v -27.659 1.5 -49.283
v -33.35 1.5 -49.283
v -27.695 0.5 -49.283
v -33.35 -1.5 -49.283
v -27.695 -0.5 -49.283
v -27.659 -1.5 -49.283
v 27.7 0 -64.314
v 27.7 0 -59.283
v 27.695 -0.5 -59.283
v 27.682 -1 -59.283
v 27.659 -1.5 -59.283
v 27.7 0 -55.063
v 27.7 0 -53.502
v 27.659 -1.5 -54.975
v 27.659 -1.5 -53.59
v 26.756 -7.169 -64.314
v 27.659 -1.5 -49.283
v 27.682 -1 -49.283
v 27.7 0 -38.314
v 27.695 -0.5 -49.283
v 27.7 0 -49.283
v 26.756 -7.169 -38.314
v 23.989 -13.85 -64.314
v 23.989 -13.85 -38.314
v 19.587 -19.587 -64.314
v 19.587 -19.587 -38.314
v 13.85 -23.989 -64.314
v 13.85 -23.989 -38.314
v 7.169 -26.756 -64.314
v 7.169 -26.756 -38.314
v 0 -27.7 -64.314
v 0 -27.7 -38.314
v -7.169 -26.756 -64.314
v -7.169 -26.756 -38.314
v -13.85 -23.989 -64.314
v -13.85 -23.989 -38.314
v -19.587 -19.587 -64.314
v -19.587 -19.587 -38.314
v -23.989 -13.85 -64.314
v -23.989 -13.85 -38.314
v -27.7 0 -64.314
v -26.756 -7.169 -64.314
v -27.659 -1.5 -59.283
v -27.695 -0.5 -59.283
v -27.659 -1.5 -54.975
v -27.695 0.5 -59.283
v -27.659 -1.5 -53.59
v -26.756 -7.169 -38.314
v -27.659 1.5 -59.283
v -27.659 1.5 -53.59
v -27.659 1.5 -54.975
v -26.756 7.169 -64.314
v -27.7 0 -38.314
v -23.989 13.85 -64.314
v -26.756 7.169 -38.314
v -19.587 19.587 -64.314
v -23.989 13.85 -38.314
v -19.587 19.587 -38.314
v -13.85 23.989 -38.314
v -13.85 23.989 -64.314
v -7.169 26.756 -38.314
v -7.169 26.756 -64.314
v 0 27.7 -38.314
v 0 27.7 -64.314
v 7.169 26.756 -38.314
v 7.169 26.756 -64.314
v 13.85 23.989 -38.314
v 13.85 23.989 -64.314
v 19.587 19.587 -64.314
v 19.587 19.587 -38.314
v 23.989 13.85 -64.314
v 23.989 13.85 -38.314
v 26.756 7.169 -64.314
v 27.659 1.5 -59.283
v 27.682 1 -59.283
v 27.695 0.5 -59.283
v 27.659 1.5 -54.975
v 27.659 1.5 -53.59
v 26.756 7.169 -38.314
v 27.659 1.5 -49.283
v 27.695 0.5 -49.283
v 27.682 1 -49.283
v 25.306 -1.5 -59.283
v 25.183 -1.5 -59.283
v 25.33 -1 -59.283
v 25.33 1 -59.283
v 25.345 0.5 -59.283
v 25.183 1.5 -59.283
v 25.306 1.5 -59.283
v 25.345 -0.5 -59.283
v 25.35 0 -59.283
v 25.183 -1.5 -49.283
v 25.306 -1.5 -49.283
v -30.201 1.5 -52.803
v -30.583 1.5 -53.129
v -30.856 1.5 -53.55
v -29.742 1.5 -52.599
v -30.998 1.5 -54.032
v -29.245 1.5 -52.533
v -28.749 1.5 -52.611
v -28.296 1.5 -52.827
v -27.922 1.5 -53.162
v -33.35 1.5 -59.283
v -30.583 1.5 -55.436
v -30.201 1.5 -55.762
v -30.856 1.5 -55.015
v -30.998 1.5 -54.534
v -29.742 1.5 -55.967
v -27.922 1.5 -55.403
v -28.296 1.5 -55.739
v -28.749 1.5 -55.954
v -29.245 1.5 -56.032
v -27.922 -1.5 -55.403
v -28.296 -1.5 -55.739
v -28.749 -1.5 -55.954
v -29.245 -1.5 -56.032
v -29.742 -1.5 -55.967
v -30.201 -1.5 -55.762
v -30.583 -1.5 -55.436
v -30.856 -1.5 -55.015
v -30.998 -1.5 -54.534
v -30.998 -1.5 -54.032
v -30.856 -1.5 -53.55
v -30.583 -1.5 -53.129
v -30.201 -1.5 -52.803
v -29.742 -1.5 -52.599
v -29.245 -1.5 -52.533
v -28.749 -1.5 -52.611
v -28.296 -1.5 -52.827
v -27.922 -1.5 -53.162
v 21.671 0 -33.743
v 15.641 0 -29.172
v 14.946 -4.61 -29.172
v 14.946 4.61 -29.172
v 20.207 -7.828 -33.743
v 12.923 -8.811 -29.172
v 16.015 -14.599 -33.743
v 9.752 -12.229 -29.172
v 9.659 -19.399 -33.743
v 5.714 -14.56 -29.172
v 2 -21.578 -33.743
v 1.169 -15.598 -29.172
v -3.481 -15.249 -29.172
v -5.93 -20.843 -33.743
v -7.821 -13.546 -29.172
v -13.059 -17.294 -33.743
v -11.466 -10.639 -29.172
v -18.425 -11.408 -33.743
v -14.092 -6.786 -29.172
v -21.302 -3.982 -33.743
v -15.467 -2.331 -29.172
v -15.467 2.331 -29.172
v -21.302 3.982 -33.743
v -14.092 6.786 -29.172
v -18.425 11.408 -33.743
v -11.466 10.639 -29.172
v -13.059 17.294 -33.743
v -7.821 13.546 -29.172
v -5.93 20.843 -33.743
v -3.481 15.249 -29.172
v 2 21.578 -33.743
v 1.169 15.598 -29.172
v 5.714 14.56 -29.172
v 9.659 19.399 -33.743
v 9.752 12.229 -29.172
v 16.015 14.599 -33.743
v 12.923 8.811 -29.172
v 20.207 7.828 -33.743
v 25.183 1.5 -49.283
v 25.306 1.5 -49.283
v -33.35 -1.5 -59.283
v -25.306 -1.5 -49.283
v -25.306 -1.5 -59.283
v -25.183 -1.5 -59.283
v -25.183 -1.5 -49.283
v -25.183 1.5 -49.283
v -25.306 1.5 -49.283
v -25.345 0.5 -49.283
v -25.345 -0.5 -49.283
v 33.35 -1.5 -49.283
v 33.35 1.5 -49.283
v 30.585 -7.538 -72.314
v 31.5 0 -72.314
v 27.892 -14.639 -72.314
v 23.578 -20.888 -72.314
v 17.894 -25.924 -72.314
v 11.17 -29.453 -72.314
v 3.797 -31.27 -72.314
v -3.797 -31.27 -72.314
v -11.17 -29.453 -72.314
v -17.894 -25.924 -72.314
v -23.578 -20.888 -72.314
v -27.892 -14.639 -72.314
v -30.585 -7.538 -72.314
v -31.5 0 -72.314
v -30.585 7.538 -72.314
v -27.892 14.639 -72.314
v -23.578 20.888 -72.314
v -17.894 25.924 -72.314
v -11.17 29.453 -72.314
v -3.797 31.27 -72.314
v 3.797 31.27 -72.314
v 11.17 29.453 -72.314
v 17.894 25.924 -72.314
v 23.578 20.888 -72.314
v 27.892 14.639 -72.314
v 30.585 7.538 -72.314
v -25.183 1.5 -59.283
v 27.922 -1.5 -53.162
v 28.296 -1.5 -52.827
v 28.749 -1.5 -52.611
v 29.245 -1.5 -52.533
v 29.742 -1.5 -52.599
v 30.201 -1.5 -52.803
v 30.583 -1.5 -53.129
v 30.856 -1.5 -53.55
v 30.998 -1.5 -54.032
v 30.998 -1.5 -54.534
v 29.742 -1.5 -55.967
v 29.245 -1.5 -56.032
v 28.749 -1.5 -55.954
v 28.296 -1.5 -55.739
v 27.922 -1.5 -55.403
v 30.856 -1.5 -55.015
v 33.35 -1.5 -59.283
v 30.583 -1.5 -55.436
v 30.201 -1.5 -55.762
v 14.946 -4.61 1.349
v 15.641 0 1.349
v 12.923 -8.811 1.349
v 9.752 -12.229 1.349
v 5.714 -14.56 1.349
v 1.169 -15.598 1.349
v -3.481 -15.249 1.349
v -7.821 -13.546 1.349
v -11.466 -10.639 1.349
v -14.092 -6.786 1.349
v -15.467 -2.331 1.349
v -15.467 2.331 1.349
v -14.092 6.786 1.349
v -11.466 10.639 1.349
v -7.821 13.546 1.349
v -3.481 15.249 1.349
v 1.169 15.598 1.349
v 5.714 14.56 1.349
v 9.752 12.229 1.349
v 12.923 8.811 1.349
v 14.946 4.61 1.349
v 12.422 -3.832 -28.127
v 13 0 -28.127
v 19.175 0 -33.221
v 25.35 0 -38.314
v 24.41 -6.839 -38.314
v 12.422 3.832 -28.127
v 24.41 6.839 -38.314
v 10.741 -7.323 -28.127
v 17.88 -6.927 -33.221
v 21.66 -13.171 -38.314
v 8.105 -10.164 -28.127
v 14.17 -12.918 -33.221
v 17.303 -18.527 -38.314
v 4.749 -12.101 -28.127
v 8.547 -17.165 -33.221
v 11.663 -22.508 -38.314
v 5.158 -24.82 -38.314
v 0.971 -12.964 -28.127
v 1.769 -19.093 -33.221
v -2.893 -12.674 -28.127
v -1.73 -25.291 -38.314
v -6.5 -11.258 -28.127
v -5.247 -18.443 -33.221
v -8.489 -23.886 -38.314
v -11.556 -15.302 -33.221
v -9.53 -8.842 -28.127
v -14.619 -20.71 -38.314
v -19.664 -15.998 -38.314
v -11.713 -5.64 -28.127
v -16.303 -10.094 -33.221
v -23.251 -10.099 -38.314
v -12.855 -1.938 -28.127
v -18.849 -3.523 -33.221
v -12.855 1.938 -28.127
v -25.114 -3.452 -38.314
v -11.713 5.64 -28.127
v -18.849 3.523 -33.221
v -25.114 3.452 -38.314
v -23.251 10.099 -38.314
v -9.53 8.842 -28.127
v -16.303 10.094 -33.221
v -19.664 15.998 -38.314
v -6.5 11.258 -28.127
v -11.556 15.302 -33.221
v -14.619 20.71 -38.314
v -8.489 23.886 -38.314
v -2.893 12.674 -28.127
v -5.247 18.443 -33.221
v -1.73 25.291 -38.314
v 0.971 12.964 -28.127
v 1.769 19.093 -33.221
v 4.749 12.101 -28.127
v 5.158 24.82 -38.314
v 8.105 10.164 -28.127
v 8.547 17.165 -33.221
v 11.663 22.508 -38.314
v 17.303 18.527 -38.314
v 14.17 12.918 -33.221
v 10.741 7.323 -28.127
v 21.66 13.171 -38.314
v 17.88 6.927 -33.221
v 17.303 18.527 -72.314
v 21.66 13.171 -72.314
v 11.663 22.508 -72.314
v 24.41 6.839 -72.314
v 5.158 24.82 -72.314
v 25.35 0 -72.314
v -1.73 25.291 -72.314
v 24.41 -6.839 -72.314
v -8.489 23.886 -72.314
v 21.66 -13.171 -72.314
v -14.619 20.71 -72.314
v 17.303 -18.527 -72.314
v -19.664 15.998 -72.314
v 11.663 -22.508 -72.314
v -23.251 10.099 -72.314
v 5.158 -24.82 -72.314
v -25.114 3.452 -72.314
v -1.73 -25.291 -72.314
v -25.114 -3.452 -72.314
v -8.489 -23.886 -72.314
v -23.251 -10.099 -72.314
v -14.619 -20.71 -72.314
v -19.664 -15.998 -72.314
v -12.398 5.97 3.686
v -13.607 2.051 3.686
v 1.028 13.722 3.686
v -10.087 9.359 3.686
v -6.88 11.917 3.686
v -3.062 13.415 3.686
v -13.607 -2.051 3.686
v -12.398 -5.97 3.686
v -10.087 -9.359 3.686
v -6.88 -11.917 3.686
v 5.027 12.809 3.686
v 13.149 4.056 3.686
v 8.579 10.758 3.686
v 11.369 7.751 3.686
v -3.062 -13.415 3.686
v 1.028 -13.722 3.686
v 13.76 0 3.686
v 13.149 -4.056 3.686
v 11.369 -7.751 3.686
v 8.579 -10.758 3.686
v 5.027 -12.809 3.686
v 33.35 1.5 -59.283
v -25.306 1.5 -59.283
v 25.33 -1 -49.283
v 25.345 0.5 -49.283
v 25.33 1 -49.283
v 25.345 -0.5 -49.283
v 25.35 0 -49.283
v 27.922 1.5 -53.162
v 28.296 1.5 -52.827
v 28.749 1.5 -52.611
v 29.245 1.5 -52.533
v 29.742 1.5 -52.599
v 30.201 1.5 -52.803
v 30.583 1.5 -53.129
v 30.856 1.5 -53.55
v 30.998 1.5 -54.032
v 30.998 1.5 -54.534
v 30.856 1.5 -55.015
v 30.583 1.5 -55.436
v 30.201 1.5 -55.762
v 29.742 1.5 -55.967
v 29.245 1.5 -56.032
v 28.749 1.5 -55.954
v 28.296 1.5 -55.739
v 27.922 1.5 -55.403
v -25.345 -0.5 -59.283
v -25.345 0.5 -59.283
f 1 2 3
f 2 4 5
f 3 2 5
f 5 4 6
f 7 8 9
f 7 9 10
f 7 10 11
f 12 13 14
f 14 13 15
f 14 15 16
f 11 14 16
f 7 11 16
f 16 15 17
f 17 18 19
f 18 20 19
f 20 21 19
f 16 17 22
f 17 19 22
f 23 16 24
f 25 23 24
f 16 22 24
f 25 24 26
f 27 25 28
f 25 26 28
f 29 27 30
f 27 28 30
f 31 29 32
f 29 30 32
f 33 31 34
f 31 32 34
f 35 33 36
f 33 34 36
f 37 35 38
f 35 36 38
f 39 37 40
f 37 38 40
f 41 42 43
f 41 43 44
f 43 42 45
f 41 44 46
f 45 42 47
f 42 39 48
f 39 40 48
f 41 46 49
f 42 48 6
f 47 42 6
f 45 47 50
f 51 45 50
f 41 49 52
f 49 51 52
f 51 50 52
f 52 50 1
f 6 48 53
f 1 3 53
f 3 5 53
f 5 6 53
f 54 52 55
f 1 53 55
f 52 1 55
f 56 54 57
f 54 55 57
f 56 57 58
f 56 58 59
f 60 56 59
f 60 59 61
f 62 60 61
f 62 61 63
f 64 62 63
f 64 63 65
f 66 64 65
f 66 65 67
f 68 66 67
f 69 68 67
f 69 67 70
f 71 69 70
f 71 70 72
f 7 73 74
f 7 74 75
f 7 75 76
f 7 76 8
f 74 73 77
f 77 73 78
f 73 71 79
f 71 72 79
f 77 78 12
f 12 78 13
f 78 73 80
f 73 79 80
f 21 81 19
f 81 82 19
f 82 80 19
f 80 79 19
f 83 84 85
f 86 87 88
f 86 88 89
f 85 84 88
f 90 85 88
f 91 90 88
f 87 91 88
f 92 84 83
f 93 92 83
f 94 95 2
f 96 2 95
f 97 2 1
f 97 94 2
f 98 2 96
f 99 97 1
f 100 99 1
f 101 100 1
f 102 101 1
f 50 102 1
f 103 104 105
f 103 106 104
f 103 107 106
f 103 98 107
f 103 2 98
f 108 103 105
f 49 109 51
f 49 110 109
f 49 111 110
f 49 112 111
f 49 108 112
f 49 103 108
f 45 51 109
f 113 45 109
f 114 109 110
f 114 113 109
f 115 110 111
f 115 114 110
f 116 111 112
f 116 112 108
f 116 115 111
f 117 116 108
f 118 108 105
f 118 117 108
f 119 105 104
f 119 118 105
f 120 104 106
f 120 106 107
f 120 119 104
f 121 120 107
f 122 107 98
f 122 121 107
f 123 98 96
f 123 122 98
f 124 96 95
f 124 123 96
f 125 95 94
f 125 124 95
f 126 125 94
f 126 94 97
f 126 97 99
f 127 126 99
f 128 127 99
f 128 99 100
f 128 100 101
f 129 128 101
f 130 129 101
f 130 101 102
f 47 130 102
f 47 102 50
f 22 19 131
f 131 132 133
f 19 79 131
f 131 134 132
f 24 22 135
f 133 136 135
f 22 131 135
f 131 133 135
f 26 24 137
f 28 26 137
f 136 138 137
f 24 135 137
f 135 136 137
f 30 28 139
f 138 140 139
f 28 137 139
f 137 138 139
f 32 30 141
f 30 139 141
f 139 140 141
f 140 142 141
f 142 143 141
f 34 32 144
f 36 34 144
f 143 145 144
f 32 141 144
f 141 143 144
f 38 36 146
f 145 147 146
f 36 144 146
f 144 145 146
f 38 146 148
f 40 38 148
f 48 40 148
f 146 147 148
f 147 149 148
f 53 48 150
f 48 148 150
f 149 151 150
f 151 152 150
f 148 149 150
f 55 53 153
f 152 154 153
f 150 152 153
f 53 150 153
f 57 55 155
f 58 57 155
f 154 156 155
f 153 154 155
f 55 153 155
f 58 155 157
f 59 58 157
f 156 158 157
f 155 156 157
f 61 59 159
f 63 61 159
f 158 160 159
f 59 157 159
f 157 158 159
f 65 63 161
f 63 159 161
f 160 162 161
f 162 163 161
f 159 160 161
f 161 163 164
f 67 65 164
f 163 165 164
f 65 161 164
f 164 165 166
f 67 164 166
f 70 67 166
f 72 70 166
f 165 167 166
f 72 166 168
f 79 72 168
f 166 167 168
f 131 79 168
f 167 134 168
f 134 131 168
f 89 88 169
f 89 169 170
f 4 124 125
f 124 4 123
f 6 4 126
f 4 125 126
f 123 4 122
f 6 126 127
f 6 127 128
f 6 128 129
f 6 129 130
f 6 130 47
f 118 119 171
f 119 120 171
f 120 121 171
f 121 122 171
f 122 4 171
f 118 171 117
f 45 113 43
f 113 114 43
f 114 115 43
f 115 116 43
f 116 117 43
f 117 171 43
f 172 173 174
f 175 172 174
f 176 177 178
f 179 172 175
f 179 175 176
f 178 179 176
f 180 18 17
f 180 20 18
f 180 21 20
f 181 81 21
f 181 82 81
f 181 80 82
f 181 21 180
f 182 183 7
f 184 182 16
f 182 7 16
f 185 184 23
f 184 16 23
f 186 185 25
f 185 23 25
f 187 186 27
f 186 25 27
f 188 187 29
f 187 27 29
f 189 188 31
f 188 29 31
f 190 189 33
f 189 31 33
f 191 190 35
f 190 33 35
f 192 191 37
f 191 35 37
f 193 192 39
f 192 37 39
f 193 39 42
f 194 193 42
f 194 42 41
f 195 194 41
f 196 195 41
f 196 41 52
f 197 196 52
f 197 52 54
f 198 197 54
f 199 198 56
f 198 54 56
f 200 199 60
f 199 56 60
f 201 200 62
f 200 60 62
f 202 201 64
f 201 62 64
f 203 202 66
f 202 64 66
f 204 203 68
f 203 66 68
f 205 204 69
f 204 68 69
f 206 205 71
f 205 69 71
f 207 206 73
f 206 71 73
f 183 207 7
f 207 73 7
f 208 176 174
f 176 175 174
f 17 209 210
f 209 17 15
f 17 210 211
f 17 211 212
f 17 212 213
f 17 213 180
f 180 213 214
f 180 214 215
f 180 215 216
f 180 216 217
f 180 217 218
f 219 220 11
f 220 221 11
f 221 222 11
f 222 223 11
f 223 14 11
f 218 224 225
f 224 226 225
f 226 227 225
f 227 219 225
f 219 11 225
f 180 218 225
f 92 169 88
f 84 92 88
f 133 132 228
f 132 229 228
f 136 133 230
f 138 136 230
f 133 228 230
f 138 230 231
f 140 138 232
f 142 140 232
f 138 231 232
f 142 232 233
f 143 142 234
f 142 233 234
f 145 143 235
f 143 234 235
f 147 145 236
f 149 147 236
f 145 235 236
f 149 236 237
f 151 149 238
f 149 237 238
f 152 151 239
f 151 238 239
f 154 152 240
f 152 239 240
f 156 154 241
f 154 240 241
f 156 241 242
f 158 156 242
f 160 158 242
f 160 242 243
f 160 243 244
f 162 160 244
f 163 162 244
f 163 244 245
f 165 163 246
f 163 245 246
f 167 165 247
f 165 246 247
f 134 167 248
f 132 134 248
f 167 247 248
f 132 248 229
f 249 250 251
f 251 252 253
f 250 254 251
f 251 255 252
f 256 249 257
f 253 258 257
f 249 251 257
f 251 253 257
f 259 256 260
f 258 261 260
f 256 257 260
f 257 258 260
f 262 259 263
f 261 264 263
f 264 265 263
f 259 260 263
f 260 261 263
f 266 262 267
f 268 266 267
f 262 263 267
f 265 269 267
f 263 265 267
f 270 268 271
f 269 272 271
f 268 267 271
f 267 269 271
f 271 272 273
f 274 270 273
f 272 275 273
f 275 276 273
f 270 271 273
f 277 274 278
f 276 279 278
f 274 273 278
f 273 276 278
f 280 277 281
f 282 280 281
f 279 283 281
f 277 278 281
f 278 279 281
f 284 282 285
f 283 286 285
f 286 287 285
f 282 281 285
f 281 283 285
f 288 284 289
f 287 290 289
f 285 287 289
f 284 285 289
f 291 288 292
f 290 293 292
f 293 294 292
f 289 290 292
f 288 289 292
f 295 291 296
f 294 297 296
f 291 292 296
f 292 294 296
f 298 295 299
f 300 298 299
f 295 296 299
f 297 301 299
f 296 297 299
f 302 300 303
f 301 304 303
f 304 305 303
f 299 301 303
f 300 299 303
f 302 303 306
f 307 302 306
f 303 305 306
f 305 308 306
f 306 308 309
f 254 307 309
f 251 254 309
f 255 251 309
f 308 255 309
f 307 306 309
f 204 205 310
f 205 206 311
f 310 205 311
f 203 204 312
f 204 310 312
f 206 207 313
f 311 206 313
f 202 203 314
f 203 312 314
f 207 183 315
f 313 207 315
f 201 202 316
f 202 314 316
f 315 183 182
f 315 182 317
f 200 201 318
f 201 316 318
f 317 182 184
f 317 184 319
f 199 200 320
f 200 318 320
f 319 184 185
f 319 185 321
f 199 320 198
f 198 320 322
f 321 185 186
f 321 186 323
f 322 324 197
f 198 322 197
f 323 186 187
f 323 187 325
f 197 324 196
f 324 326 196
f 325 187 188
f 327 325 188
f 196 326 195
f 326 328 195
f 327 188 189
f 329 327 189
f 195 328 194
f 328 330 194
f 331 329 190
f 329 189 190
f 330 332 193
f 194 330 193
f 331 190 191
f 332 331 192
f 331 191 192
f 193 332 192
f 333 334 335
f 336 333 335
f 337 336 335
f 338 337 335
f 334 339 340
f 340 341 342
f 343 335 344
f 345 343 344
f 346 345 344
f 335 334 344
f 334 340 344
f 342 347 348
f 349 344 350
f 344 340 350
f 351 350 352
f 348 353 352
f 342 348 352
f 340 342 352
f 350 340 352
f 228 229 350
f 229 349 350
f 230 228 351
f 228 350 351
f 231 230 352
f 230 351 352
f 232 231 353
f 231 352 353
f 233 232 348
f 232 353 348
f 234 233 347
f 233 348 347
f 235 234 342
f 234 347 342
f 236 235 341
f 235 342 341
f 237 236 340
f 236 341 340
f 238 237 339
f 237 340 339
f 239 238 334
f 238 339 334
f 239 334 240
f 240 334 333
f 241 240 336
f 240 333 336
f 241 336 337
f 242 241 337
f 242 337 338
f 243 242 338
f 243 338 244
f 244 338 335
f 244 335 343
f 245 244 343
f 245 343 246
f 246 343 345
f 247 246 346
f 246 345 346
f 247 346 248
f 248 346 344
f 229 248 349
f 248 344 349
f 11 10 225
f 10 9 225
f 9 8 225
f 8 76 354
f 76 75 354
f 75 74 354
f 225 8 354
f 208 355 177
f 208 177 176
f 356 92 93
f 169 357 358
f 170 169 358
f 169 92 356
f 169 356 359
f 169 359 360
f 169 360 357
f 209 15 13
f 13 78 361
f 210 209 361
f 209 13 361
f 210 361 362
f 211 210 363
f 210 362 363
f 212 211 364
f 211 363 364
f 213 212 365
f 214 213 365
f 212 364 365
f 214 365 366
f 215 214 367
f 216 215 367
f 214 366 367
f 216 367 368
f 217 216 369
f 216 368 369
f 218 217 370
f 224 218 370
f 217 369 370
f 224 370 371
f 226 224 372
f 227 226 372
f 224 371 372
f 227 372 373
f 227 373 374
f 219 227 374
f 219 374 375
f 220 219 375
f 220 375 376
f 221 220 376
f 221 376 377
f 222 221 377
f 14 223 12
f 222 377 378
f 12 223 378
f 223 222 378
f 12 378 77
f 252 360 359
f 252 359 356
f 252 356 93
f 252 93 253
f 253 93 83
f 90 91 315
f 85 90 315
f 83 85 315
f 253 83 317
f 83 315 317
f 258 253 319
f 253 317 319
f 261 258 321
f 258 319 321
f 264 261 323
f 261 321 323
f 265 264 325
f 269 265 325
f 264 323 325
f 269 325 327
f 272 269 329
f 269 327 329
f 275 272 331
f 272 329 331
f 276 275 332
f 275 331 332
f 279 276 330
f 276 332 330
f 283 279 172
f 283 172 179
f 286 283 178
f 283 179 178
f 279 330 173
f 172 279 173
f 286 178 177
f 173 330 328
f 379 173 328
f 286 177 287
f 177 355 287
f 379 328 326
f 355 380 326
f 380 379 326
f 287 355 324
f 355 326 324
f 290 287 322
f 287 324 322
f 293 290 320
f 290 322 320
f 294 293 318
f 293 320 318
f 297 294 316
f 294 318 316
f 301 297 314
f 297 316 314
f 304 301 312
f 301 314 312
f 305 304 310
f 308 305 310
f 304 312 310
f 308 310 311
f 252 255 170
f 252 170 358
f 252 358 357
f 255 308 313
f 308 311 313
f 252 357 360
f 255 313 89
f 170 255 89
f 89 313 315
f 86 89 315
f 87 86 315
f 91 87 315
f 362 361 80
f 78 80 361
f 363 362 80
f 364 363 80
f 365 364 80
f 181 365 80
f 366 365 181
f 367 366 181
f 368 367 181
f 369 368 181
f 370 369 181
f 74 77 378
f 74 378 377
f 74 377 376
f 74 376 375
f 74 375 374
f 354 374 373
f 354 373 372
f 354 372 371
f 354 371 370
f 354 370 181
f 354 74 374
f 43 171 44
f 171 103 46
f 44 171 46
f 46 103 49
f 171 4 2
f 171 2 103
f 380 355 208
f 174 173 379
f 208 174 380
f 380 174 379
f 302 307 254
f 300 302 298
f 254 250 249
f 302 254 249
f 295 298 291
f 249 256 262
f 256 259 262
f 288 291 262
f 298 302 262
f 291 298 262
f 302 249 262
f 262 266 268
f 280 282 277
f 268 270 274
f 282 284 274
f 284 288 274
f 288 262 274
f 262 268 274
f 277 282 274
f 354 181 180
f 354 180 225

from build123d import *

# Parameters (mm, degrees)
EXTRUDE_1_DEPTH      = 1.5
EXTRUDE_1_DEPTH_BACK = 1.5
SKETCH_2_W           = 8.167130209
SKETCH_2_H           = 10
SKETCH_2_R           = 1.75


with BuildPart() as part:
    # 草图1 → 旋转1 (revolve)
    with BuildSketch(Plane(origin=(0, 0, 0), x_dir=(1, 0, 0), z_dir=(0, 1, 0))):
        Polygon((25.35, 72.313545186), (31.5, 72.313545186), (27.7, 64.313545186), (27.7, 38.313545186), (15.641285641, 29.17200386), (15.641285641, -1.349457697), (13.76021029, -3.686454814), (0, -3.686454814), (0, 28.127467739), (13, 28.127467739), (25.35, 38.313545186), align=None)
    revolve(axis=Axis((0, 0, 0), (0, 0, -1)))

    # 草图2 → 凸台-拉伸1 (add, two sides: drawn at the far end of the back side and taken through both)
    # profile 1 of 2: a face of its own
    with BuildSketch(Plane(origin=(0, 0, 0), x_dir=(1, 0, 0), z_dir=(0, 1, 0)).offset(-EXTRUDE_1_DEPTH_BACK)):
        with Locations((29.266434896, 54.282588322)):
            Rectangle(SKETCH_2_W, SKETCH_2_H)
        with Locations((29.266434895, 54.282588322)):
            Circle(SKETCH_2_R, mode=Mode.SUBTRACT)
    # profile 2 of 2: a face of its own
    with BuildSketch(Plane(origin=(0, 0, 0), x_dir=(1, 0, 0), z_dir=(0, 1, 0)).offset(-EXTRUDE_1_DEPTH_BACK)):
        with Locations((-29.266434896, 54.282588322)):
            Rectangle(SKETCH_2_W, SKETCH_2_H)
        with Locations((-29.266434895, 54.282588322)):
            Circle(SKETCH_2_R, mode=Mode.SUBTRACT)
    extrude(amount=EXTRUDE_1_DEPTH + EXTRUDE_1_DEPTH_BACK)


solid = part.part
